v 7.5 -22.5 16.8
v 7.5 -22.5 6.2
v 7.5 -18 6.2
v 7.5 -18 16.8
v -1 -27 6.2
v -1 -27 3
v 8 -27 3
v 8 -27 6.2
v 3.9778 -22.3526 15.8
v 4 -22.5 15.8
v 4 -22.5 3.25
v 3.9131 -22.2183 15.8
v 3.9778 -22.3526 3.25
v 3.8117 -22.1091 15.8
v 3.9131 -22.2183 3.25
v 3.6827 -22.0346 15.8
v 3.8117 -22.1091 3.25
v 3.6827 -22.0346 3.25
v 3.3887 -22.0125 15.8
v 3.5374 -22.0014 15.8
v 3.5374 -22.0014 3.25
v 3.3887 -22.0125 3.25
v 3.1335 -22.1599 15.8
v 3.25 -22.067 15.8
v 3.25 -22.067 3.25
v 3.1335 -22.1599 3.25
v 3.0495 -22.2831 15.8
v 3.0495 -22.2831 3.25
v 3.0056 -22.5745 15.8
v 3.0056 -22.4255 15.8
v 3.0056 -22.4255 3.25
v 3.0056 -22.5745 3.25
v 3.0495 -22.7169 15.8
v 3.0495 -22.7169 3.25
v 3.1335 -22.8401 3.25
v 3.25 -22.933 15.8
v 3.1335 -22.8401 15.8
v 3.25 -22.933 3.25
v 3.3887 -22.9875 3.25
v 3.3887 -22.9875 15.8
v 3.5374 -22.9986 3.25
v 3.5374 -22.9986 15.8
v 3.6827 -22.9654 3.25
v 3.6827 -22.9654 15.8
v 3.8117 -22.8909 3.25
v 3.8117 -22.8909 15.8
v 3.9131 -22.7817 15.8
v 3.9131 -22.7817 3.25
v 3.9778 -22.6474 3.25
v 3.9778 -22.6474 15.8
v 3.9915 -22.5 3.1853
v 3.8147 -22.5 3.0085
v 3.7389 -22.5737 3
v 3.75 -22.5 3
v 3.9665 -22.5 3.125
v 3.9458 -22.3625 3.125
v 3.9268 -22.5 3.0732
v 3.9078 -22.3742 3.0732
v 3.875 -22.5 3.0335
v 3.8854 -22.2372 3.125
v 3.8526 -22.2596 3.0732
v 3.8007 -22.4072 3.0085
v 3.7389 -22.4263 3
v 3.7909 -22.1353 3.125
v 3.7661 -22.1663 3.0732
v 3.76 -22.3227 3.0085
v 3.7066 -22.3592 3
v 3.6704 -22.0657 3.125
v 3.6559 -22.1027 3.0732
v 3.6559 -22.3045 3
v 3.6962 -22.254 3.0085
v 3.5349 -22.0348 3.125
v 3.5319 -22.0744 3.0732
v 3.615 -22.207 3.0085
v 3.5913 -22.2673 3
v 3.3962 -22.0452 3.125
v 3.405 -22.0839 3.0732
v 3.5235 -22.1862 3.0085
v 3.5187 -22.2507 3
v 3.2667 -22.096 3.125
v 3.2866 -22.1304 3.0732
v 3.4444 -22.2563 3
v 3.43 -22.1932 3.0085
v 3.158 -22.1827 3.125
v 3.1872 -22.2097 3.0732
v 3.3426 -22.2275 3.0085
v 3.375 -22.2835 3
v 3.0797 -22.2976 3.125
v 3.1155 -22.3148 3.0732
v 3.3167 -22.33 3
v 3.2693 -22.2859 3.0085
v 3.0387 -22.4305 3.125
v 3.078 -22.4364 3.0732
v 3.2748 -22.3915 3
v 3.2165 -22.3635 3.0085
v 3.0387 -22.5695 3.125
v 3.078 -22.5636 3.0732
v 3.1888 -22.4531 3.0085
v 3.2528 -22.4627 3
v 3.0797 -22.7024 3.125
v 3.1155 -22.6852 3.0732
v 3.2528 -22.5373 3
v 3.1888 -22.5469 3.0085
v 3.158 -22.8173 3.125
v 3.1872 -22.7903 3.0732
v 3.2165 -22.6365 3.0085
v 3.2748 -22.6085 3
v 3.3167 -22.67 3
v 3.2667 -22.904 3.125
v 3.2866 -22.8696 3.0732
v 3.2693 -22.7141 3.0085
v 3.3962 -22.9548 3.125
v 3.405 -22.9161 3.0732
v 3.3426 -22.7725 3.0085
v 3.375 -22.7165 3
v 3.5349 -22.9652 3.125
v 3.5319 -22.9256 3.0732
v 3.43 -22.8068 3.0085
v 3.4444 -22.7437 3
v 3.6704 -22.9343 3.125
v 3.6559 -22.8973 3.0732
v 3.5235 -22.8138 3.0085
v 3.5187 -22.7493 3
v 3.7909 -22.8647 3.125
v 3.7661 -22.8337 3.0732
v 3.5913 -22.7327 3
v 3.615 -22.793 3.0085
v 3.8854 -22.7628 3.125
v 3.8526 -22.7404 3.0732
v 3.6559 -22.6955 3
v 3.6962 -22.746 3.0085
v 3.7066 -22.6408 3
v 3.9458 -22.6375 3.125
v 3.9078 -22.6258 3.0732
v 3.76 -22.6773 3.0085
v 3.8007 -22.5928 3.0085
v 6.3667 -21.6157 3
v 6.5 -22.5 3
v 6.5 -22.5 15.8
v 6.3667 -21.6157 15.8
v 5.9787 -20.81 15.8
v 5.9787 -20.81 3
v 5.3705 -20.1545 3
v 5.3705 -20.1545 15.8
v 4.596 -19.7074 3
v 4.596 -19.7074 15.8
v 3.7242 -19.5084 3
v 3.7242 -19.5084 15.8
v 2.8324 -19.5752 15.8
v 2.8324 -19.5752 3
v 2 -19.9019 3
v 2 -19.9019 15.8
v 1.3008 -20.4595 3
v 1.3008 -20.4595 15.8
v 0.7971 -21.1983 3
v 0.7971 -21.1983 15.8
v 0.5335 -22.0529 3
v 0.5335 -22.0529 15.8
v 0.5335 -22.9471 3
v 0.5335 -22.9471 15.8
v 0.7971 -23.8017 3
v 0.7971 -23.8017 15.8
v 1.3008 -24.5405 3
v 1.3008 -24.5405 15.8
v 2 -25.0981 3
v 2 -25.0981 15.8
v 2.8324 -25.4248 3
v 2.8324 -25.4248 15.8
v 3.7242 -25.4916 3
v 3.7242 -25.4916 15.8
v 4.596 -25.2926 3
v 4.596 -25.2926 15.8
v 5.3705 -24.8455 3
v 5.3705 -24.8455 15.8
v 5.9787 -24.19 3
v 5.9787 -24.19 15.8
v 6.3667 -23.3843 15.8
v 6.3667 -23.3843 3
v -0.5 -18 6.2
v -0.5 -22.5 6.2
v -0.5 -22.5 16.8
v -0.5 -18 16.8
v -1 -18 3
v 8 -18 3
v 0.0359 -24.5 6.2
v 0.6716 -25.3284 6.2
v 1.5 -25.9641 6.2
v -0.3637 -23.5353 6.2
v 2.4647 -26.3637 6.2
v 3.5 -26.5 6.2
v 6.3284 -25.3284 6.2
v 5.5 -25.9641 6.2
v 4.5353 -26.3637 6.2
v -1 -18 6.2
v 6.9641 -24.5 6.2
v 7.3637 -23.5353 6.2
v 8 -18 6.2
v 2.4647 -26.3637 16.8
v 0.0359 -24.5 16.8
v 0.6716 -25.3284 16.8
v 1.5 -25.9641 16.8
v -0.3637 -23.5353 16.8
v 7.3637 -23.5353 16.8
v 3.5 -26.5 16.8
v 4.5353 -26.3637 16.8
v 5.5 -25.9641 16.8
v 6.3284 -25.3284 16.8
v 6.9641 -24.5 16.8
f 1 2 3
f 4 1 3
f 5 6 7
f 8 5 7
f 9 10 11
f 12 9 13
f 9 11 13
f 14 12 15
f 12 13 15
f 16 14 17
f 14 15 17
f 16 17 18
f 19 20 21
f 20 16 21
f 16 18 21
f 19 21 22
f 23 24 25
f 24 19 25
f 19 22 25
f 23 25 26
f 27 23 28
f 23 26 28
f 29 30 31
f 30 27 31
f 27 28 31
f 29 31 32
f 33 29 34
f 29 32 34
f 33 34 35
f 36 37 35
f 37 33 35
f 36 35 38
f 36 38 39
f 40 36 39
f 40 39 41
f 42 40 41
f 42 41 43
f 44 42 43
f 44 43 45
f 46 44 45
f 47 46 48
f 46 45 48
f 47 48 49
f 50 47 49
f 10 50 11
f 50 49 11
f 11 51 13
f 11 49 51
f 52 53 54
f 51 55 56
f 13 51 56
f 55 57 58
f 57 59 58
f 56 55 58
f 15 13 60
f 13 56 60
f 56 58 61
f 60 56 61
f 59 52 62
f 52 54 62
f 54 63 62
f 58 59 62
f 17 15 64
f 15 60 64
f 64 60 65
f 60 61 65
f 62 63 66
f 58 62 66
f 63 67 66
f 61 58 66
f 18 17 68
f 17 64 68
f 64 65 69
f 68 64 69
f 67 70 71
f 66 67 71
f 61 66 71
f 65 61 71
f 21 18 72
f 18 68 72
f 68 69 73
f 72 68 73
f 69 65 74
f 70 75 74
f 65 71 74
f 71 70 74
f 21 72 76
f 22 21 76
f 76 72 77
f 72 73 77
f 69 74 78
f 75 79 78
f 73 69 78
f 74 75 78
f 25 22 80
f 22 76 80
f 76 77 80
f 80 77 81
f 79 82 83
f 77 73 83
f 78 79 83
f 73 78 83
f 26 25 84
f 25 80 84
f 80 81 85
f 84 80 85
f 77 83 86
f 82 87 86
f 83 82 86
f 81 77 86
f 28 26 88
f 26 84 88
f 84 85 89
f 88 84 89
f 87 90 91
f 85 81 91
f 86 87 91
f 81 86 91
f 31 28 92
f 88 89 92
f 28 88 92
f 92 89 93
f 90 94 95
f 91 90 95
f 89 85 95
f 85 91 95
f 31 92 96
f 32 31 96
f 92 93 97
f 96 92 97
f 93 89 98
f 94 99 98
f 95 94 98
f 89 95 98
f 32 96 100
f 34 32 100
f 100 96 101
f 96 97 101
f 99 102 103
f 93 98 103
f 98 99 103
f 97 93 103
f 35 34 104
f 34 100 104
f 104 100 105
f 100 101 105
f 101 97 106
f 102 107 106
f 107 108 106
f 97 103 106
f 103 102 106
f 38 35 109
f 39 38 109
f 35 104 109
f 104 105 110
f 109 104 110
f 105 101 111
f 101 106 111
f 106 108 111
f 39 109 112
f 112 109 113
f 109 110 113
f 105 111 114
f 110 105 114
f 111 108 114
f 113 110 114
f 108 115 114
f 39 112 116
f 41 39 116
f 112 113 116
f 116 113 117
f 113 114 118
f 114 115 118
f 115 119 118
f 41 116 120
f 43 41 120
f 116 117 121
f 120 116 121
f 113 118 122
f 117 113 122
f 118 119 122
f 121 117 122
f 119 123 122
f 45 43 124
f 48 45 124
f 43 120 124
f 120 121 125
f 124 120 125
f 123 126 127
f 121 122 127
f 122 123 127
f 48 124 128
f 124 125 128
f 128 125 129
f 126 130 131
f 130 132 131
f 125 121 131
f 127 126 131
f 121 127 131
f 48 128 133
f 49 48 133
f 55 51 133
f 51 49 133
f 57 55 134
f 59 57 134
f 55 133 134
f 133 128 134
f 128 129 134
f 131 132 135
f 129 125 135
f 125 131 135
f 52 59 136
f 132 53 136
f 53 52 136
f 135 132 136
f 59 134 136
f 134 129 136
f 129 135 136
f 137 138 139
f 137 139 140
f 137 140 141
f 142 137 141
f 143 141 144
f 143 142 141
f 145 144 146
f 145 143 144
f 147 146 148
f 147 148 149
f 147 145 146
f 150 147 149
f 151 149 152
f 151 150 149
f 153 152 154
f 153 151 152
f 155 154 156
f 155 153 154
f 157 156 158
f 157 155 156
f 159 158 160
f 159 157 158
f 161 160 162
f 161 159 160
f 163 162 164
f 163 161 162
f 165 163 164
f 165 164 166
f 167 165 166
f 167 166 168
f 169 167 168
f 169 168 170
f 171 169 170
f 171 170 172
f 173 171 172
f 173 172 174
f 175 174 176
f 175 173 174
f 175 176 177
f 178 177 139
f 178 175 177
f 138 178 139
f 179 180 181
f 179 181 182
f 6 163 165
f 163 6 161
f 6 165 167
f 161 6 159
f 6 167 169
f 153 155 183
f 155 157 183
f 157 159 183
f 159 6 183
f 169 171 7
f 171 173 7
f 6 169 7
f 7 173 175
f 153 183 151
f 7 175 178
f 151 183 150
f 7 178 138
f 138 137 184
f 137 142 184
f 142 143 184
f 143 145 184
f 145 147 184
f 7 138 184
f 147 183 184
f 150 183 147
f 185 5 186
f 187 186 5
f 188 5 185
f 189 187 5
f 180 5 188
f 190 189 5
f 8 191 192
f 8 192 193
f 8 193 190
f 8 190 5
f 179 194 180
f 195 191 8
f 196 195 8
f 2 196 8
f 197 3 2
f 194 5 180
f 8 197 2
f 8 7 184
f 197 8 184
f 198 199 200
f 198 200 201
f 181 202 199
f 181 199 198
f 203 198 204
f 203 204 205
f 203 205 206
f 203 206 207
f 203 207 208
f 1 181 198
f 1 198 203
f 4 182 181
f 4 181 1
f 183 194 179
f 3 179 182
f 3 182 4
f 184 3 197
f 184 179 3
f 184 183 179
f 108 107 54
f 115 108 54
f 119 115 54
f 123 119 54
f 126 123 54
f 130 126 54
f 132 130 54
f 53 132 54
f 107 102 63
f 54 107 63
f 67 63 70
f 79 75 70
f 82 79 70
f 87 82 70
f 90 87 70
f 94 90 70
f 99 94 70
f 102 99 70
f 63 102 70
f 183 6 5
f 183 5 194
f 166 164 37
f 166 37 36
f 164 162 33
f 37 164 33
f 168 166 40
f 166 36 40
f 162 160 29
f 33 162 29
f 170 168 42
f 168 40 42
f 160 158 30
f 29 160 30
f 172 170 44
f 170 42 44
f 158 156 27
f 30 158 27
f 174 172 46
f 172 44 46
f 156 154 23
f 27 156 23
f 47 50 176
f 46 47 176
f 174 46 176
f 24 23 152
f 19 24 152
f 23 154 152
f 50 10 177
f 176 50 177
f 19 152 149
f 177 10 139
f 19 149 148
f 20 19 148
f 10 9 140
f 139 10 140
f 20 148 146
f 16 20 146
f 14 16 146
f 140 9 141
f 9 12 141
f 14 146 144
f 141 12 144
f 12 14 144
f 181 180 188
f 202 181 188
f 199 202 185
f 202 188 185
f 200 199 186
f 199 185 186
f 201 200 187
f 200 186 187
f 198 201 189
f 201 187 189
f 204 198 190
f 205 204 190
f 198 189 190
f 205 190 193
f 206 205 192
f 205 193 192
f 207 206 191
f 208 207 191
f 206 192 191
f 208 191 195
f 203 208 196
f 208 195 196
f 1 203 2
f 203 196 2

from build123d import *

# Parameters (mm, degrees)
CYLINDER265_R     = 0.5
CYLINDER265_DEPTH = 13.5
FILLET221_R       = 0.25
CYLINDER264_R     = 3
CYLINDER264_DEPTH = 12.8
CYLINDER263_R     = 4
CYLINDER263_DEPTH = 13.8
BOX299_W          = 8
BOX299_H          = 4.5
BOX299_DEPTH      = 13.8
BOX298_W          = 9
BOX298_H          = 9
BOX298_DEPTH      = 3.2


with BuildPart() as fillet221:
    # Cylinder265 → Cylinder265 (new body)
    with BuildSketch(Plane.XY):
        Circle(CYLINDER265_R)
    extrude(amount=CYLINDER265_DEPTH)

    # Fillet221
    fillet221_edges = [fillet221.edges().sort_by_distance(p)[0] for p in [
        (-0.5, 0, 0),
    ]]
    fillet(fillet221_edges, radius=FILLET221_R)


with BuildPart() as fillet221_1:
    # Fillet221 placement: moved
    add(fillet221.part.moved(Location((4.5, 4.5, 0))))


with BuildPart() as cilindro264:
    # Cylinder264 → Cylinder264 (new body)
    with BuildSketch(Plane(origin=(4.5, 4.5, 0), x_dir=(1, 0, 0), z_dir=(0, 0, 1))):
        Circle(CYLINDER264_R)
    extrude(amount=CYLINDER264_DEPTH)


with BuildPart() as cilindro263:
    # Cylinder263 → Cylinder263 (new body)
    with BuildSketch(Plane(origin=(4.5, 4.5, 0), x_dir=(1, 0, 0), z_dir=(0, 0, 1))):
        Circle(CYLINDER263_R)
    extrude(amount=CYLINDER263_DEPTH)


with BuildPart() as cubo284:
    # Box299 → Box299 (new body)
    with BuildSketch(Plane(origin=(0.5, 4.5, 0), x_dir=(1, 0, 0), z_dir=(0, 0, 1))):
        with Locations((4, 2.25)):
            Rectangle(BOX299_W, BOX299_H)
    extrude(amount=BOX299_DEPTH)


with BuildPart() as conector_vcc:
    # Box298 → Box298 (new body)
    with BuildSketch(Plane.XY):
        with Locations((4.5, 4.5)):
            Rectangle(BOX298_W, BOX298_H)
    extrude(amount=BOX298_DEPTH)

    # Fusion202: union Cilindro263, Cubo284
    add(cilindro263.part)
    add(cubo284.part)

    # Cut346: cut Cilindro264
    add(cilindro264.part, mode=Mode.SUBTRACT)

    # Fusion203: union Fillet221
    add(fillet221_1.part)


with BuildPart() as conector_vcc_1:
    # Fusion203 placement: moved
    add(conector_vcc.part.moved(Location((-1, -27, 3))))


solid = conector_vcc_1.part
